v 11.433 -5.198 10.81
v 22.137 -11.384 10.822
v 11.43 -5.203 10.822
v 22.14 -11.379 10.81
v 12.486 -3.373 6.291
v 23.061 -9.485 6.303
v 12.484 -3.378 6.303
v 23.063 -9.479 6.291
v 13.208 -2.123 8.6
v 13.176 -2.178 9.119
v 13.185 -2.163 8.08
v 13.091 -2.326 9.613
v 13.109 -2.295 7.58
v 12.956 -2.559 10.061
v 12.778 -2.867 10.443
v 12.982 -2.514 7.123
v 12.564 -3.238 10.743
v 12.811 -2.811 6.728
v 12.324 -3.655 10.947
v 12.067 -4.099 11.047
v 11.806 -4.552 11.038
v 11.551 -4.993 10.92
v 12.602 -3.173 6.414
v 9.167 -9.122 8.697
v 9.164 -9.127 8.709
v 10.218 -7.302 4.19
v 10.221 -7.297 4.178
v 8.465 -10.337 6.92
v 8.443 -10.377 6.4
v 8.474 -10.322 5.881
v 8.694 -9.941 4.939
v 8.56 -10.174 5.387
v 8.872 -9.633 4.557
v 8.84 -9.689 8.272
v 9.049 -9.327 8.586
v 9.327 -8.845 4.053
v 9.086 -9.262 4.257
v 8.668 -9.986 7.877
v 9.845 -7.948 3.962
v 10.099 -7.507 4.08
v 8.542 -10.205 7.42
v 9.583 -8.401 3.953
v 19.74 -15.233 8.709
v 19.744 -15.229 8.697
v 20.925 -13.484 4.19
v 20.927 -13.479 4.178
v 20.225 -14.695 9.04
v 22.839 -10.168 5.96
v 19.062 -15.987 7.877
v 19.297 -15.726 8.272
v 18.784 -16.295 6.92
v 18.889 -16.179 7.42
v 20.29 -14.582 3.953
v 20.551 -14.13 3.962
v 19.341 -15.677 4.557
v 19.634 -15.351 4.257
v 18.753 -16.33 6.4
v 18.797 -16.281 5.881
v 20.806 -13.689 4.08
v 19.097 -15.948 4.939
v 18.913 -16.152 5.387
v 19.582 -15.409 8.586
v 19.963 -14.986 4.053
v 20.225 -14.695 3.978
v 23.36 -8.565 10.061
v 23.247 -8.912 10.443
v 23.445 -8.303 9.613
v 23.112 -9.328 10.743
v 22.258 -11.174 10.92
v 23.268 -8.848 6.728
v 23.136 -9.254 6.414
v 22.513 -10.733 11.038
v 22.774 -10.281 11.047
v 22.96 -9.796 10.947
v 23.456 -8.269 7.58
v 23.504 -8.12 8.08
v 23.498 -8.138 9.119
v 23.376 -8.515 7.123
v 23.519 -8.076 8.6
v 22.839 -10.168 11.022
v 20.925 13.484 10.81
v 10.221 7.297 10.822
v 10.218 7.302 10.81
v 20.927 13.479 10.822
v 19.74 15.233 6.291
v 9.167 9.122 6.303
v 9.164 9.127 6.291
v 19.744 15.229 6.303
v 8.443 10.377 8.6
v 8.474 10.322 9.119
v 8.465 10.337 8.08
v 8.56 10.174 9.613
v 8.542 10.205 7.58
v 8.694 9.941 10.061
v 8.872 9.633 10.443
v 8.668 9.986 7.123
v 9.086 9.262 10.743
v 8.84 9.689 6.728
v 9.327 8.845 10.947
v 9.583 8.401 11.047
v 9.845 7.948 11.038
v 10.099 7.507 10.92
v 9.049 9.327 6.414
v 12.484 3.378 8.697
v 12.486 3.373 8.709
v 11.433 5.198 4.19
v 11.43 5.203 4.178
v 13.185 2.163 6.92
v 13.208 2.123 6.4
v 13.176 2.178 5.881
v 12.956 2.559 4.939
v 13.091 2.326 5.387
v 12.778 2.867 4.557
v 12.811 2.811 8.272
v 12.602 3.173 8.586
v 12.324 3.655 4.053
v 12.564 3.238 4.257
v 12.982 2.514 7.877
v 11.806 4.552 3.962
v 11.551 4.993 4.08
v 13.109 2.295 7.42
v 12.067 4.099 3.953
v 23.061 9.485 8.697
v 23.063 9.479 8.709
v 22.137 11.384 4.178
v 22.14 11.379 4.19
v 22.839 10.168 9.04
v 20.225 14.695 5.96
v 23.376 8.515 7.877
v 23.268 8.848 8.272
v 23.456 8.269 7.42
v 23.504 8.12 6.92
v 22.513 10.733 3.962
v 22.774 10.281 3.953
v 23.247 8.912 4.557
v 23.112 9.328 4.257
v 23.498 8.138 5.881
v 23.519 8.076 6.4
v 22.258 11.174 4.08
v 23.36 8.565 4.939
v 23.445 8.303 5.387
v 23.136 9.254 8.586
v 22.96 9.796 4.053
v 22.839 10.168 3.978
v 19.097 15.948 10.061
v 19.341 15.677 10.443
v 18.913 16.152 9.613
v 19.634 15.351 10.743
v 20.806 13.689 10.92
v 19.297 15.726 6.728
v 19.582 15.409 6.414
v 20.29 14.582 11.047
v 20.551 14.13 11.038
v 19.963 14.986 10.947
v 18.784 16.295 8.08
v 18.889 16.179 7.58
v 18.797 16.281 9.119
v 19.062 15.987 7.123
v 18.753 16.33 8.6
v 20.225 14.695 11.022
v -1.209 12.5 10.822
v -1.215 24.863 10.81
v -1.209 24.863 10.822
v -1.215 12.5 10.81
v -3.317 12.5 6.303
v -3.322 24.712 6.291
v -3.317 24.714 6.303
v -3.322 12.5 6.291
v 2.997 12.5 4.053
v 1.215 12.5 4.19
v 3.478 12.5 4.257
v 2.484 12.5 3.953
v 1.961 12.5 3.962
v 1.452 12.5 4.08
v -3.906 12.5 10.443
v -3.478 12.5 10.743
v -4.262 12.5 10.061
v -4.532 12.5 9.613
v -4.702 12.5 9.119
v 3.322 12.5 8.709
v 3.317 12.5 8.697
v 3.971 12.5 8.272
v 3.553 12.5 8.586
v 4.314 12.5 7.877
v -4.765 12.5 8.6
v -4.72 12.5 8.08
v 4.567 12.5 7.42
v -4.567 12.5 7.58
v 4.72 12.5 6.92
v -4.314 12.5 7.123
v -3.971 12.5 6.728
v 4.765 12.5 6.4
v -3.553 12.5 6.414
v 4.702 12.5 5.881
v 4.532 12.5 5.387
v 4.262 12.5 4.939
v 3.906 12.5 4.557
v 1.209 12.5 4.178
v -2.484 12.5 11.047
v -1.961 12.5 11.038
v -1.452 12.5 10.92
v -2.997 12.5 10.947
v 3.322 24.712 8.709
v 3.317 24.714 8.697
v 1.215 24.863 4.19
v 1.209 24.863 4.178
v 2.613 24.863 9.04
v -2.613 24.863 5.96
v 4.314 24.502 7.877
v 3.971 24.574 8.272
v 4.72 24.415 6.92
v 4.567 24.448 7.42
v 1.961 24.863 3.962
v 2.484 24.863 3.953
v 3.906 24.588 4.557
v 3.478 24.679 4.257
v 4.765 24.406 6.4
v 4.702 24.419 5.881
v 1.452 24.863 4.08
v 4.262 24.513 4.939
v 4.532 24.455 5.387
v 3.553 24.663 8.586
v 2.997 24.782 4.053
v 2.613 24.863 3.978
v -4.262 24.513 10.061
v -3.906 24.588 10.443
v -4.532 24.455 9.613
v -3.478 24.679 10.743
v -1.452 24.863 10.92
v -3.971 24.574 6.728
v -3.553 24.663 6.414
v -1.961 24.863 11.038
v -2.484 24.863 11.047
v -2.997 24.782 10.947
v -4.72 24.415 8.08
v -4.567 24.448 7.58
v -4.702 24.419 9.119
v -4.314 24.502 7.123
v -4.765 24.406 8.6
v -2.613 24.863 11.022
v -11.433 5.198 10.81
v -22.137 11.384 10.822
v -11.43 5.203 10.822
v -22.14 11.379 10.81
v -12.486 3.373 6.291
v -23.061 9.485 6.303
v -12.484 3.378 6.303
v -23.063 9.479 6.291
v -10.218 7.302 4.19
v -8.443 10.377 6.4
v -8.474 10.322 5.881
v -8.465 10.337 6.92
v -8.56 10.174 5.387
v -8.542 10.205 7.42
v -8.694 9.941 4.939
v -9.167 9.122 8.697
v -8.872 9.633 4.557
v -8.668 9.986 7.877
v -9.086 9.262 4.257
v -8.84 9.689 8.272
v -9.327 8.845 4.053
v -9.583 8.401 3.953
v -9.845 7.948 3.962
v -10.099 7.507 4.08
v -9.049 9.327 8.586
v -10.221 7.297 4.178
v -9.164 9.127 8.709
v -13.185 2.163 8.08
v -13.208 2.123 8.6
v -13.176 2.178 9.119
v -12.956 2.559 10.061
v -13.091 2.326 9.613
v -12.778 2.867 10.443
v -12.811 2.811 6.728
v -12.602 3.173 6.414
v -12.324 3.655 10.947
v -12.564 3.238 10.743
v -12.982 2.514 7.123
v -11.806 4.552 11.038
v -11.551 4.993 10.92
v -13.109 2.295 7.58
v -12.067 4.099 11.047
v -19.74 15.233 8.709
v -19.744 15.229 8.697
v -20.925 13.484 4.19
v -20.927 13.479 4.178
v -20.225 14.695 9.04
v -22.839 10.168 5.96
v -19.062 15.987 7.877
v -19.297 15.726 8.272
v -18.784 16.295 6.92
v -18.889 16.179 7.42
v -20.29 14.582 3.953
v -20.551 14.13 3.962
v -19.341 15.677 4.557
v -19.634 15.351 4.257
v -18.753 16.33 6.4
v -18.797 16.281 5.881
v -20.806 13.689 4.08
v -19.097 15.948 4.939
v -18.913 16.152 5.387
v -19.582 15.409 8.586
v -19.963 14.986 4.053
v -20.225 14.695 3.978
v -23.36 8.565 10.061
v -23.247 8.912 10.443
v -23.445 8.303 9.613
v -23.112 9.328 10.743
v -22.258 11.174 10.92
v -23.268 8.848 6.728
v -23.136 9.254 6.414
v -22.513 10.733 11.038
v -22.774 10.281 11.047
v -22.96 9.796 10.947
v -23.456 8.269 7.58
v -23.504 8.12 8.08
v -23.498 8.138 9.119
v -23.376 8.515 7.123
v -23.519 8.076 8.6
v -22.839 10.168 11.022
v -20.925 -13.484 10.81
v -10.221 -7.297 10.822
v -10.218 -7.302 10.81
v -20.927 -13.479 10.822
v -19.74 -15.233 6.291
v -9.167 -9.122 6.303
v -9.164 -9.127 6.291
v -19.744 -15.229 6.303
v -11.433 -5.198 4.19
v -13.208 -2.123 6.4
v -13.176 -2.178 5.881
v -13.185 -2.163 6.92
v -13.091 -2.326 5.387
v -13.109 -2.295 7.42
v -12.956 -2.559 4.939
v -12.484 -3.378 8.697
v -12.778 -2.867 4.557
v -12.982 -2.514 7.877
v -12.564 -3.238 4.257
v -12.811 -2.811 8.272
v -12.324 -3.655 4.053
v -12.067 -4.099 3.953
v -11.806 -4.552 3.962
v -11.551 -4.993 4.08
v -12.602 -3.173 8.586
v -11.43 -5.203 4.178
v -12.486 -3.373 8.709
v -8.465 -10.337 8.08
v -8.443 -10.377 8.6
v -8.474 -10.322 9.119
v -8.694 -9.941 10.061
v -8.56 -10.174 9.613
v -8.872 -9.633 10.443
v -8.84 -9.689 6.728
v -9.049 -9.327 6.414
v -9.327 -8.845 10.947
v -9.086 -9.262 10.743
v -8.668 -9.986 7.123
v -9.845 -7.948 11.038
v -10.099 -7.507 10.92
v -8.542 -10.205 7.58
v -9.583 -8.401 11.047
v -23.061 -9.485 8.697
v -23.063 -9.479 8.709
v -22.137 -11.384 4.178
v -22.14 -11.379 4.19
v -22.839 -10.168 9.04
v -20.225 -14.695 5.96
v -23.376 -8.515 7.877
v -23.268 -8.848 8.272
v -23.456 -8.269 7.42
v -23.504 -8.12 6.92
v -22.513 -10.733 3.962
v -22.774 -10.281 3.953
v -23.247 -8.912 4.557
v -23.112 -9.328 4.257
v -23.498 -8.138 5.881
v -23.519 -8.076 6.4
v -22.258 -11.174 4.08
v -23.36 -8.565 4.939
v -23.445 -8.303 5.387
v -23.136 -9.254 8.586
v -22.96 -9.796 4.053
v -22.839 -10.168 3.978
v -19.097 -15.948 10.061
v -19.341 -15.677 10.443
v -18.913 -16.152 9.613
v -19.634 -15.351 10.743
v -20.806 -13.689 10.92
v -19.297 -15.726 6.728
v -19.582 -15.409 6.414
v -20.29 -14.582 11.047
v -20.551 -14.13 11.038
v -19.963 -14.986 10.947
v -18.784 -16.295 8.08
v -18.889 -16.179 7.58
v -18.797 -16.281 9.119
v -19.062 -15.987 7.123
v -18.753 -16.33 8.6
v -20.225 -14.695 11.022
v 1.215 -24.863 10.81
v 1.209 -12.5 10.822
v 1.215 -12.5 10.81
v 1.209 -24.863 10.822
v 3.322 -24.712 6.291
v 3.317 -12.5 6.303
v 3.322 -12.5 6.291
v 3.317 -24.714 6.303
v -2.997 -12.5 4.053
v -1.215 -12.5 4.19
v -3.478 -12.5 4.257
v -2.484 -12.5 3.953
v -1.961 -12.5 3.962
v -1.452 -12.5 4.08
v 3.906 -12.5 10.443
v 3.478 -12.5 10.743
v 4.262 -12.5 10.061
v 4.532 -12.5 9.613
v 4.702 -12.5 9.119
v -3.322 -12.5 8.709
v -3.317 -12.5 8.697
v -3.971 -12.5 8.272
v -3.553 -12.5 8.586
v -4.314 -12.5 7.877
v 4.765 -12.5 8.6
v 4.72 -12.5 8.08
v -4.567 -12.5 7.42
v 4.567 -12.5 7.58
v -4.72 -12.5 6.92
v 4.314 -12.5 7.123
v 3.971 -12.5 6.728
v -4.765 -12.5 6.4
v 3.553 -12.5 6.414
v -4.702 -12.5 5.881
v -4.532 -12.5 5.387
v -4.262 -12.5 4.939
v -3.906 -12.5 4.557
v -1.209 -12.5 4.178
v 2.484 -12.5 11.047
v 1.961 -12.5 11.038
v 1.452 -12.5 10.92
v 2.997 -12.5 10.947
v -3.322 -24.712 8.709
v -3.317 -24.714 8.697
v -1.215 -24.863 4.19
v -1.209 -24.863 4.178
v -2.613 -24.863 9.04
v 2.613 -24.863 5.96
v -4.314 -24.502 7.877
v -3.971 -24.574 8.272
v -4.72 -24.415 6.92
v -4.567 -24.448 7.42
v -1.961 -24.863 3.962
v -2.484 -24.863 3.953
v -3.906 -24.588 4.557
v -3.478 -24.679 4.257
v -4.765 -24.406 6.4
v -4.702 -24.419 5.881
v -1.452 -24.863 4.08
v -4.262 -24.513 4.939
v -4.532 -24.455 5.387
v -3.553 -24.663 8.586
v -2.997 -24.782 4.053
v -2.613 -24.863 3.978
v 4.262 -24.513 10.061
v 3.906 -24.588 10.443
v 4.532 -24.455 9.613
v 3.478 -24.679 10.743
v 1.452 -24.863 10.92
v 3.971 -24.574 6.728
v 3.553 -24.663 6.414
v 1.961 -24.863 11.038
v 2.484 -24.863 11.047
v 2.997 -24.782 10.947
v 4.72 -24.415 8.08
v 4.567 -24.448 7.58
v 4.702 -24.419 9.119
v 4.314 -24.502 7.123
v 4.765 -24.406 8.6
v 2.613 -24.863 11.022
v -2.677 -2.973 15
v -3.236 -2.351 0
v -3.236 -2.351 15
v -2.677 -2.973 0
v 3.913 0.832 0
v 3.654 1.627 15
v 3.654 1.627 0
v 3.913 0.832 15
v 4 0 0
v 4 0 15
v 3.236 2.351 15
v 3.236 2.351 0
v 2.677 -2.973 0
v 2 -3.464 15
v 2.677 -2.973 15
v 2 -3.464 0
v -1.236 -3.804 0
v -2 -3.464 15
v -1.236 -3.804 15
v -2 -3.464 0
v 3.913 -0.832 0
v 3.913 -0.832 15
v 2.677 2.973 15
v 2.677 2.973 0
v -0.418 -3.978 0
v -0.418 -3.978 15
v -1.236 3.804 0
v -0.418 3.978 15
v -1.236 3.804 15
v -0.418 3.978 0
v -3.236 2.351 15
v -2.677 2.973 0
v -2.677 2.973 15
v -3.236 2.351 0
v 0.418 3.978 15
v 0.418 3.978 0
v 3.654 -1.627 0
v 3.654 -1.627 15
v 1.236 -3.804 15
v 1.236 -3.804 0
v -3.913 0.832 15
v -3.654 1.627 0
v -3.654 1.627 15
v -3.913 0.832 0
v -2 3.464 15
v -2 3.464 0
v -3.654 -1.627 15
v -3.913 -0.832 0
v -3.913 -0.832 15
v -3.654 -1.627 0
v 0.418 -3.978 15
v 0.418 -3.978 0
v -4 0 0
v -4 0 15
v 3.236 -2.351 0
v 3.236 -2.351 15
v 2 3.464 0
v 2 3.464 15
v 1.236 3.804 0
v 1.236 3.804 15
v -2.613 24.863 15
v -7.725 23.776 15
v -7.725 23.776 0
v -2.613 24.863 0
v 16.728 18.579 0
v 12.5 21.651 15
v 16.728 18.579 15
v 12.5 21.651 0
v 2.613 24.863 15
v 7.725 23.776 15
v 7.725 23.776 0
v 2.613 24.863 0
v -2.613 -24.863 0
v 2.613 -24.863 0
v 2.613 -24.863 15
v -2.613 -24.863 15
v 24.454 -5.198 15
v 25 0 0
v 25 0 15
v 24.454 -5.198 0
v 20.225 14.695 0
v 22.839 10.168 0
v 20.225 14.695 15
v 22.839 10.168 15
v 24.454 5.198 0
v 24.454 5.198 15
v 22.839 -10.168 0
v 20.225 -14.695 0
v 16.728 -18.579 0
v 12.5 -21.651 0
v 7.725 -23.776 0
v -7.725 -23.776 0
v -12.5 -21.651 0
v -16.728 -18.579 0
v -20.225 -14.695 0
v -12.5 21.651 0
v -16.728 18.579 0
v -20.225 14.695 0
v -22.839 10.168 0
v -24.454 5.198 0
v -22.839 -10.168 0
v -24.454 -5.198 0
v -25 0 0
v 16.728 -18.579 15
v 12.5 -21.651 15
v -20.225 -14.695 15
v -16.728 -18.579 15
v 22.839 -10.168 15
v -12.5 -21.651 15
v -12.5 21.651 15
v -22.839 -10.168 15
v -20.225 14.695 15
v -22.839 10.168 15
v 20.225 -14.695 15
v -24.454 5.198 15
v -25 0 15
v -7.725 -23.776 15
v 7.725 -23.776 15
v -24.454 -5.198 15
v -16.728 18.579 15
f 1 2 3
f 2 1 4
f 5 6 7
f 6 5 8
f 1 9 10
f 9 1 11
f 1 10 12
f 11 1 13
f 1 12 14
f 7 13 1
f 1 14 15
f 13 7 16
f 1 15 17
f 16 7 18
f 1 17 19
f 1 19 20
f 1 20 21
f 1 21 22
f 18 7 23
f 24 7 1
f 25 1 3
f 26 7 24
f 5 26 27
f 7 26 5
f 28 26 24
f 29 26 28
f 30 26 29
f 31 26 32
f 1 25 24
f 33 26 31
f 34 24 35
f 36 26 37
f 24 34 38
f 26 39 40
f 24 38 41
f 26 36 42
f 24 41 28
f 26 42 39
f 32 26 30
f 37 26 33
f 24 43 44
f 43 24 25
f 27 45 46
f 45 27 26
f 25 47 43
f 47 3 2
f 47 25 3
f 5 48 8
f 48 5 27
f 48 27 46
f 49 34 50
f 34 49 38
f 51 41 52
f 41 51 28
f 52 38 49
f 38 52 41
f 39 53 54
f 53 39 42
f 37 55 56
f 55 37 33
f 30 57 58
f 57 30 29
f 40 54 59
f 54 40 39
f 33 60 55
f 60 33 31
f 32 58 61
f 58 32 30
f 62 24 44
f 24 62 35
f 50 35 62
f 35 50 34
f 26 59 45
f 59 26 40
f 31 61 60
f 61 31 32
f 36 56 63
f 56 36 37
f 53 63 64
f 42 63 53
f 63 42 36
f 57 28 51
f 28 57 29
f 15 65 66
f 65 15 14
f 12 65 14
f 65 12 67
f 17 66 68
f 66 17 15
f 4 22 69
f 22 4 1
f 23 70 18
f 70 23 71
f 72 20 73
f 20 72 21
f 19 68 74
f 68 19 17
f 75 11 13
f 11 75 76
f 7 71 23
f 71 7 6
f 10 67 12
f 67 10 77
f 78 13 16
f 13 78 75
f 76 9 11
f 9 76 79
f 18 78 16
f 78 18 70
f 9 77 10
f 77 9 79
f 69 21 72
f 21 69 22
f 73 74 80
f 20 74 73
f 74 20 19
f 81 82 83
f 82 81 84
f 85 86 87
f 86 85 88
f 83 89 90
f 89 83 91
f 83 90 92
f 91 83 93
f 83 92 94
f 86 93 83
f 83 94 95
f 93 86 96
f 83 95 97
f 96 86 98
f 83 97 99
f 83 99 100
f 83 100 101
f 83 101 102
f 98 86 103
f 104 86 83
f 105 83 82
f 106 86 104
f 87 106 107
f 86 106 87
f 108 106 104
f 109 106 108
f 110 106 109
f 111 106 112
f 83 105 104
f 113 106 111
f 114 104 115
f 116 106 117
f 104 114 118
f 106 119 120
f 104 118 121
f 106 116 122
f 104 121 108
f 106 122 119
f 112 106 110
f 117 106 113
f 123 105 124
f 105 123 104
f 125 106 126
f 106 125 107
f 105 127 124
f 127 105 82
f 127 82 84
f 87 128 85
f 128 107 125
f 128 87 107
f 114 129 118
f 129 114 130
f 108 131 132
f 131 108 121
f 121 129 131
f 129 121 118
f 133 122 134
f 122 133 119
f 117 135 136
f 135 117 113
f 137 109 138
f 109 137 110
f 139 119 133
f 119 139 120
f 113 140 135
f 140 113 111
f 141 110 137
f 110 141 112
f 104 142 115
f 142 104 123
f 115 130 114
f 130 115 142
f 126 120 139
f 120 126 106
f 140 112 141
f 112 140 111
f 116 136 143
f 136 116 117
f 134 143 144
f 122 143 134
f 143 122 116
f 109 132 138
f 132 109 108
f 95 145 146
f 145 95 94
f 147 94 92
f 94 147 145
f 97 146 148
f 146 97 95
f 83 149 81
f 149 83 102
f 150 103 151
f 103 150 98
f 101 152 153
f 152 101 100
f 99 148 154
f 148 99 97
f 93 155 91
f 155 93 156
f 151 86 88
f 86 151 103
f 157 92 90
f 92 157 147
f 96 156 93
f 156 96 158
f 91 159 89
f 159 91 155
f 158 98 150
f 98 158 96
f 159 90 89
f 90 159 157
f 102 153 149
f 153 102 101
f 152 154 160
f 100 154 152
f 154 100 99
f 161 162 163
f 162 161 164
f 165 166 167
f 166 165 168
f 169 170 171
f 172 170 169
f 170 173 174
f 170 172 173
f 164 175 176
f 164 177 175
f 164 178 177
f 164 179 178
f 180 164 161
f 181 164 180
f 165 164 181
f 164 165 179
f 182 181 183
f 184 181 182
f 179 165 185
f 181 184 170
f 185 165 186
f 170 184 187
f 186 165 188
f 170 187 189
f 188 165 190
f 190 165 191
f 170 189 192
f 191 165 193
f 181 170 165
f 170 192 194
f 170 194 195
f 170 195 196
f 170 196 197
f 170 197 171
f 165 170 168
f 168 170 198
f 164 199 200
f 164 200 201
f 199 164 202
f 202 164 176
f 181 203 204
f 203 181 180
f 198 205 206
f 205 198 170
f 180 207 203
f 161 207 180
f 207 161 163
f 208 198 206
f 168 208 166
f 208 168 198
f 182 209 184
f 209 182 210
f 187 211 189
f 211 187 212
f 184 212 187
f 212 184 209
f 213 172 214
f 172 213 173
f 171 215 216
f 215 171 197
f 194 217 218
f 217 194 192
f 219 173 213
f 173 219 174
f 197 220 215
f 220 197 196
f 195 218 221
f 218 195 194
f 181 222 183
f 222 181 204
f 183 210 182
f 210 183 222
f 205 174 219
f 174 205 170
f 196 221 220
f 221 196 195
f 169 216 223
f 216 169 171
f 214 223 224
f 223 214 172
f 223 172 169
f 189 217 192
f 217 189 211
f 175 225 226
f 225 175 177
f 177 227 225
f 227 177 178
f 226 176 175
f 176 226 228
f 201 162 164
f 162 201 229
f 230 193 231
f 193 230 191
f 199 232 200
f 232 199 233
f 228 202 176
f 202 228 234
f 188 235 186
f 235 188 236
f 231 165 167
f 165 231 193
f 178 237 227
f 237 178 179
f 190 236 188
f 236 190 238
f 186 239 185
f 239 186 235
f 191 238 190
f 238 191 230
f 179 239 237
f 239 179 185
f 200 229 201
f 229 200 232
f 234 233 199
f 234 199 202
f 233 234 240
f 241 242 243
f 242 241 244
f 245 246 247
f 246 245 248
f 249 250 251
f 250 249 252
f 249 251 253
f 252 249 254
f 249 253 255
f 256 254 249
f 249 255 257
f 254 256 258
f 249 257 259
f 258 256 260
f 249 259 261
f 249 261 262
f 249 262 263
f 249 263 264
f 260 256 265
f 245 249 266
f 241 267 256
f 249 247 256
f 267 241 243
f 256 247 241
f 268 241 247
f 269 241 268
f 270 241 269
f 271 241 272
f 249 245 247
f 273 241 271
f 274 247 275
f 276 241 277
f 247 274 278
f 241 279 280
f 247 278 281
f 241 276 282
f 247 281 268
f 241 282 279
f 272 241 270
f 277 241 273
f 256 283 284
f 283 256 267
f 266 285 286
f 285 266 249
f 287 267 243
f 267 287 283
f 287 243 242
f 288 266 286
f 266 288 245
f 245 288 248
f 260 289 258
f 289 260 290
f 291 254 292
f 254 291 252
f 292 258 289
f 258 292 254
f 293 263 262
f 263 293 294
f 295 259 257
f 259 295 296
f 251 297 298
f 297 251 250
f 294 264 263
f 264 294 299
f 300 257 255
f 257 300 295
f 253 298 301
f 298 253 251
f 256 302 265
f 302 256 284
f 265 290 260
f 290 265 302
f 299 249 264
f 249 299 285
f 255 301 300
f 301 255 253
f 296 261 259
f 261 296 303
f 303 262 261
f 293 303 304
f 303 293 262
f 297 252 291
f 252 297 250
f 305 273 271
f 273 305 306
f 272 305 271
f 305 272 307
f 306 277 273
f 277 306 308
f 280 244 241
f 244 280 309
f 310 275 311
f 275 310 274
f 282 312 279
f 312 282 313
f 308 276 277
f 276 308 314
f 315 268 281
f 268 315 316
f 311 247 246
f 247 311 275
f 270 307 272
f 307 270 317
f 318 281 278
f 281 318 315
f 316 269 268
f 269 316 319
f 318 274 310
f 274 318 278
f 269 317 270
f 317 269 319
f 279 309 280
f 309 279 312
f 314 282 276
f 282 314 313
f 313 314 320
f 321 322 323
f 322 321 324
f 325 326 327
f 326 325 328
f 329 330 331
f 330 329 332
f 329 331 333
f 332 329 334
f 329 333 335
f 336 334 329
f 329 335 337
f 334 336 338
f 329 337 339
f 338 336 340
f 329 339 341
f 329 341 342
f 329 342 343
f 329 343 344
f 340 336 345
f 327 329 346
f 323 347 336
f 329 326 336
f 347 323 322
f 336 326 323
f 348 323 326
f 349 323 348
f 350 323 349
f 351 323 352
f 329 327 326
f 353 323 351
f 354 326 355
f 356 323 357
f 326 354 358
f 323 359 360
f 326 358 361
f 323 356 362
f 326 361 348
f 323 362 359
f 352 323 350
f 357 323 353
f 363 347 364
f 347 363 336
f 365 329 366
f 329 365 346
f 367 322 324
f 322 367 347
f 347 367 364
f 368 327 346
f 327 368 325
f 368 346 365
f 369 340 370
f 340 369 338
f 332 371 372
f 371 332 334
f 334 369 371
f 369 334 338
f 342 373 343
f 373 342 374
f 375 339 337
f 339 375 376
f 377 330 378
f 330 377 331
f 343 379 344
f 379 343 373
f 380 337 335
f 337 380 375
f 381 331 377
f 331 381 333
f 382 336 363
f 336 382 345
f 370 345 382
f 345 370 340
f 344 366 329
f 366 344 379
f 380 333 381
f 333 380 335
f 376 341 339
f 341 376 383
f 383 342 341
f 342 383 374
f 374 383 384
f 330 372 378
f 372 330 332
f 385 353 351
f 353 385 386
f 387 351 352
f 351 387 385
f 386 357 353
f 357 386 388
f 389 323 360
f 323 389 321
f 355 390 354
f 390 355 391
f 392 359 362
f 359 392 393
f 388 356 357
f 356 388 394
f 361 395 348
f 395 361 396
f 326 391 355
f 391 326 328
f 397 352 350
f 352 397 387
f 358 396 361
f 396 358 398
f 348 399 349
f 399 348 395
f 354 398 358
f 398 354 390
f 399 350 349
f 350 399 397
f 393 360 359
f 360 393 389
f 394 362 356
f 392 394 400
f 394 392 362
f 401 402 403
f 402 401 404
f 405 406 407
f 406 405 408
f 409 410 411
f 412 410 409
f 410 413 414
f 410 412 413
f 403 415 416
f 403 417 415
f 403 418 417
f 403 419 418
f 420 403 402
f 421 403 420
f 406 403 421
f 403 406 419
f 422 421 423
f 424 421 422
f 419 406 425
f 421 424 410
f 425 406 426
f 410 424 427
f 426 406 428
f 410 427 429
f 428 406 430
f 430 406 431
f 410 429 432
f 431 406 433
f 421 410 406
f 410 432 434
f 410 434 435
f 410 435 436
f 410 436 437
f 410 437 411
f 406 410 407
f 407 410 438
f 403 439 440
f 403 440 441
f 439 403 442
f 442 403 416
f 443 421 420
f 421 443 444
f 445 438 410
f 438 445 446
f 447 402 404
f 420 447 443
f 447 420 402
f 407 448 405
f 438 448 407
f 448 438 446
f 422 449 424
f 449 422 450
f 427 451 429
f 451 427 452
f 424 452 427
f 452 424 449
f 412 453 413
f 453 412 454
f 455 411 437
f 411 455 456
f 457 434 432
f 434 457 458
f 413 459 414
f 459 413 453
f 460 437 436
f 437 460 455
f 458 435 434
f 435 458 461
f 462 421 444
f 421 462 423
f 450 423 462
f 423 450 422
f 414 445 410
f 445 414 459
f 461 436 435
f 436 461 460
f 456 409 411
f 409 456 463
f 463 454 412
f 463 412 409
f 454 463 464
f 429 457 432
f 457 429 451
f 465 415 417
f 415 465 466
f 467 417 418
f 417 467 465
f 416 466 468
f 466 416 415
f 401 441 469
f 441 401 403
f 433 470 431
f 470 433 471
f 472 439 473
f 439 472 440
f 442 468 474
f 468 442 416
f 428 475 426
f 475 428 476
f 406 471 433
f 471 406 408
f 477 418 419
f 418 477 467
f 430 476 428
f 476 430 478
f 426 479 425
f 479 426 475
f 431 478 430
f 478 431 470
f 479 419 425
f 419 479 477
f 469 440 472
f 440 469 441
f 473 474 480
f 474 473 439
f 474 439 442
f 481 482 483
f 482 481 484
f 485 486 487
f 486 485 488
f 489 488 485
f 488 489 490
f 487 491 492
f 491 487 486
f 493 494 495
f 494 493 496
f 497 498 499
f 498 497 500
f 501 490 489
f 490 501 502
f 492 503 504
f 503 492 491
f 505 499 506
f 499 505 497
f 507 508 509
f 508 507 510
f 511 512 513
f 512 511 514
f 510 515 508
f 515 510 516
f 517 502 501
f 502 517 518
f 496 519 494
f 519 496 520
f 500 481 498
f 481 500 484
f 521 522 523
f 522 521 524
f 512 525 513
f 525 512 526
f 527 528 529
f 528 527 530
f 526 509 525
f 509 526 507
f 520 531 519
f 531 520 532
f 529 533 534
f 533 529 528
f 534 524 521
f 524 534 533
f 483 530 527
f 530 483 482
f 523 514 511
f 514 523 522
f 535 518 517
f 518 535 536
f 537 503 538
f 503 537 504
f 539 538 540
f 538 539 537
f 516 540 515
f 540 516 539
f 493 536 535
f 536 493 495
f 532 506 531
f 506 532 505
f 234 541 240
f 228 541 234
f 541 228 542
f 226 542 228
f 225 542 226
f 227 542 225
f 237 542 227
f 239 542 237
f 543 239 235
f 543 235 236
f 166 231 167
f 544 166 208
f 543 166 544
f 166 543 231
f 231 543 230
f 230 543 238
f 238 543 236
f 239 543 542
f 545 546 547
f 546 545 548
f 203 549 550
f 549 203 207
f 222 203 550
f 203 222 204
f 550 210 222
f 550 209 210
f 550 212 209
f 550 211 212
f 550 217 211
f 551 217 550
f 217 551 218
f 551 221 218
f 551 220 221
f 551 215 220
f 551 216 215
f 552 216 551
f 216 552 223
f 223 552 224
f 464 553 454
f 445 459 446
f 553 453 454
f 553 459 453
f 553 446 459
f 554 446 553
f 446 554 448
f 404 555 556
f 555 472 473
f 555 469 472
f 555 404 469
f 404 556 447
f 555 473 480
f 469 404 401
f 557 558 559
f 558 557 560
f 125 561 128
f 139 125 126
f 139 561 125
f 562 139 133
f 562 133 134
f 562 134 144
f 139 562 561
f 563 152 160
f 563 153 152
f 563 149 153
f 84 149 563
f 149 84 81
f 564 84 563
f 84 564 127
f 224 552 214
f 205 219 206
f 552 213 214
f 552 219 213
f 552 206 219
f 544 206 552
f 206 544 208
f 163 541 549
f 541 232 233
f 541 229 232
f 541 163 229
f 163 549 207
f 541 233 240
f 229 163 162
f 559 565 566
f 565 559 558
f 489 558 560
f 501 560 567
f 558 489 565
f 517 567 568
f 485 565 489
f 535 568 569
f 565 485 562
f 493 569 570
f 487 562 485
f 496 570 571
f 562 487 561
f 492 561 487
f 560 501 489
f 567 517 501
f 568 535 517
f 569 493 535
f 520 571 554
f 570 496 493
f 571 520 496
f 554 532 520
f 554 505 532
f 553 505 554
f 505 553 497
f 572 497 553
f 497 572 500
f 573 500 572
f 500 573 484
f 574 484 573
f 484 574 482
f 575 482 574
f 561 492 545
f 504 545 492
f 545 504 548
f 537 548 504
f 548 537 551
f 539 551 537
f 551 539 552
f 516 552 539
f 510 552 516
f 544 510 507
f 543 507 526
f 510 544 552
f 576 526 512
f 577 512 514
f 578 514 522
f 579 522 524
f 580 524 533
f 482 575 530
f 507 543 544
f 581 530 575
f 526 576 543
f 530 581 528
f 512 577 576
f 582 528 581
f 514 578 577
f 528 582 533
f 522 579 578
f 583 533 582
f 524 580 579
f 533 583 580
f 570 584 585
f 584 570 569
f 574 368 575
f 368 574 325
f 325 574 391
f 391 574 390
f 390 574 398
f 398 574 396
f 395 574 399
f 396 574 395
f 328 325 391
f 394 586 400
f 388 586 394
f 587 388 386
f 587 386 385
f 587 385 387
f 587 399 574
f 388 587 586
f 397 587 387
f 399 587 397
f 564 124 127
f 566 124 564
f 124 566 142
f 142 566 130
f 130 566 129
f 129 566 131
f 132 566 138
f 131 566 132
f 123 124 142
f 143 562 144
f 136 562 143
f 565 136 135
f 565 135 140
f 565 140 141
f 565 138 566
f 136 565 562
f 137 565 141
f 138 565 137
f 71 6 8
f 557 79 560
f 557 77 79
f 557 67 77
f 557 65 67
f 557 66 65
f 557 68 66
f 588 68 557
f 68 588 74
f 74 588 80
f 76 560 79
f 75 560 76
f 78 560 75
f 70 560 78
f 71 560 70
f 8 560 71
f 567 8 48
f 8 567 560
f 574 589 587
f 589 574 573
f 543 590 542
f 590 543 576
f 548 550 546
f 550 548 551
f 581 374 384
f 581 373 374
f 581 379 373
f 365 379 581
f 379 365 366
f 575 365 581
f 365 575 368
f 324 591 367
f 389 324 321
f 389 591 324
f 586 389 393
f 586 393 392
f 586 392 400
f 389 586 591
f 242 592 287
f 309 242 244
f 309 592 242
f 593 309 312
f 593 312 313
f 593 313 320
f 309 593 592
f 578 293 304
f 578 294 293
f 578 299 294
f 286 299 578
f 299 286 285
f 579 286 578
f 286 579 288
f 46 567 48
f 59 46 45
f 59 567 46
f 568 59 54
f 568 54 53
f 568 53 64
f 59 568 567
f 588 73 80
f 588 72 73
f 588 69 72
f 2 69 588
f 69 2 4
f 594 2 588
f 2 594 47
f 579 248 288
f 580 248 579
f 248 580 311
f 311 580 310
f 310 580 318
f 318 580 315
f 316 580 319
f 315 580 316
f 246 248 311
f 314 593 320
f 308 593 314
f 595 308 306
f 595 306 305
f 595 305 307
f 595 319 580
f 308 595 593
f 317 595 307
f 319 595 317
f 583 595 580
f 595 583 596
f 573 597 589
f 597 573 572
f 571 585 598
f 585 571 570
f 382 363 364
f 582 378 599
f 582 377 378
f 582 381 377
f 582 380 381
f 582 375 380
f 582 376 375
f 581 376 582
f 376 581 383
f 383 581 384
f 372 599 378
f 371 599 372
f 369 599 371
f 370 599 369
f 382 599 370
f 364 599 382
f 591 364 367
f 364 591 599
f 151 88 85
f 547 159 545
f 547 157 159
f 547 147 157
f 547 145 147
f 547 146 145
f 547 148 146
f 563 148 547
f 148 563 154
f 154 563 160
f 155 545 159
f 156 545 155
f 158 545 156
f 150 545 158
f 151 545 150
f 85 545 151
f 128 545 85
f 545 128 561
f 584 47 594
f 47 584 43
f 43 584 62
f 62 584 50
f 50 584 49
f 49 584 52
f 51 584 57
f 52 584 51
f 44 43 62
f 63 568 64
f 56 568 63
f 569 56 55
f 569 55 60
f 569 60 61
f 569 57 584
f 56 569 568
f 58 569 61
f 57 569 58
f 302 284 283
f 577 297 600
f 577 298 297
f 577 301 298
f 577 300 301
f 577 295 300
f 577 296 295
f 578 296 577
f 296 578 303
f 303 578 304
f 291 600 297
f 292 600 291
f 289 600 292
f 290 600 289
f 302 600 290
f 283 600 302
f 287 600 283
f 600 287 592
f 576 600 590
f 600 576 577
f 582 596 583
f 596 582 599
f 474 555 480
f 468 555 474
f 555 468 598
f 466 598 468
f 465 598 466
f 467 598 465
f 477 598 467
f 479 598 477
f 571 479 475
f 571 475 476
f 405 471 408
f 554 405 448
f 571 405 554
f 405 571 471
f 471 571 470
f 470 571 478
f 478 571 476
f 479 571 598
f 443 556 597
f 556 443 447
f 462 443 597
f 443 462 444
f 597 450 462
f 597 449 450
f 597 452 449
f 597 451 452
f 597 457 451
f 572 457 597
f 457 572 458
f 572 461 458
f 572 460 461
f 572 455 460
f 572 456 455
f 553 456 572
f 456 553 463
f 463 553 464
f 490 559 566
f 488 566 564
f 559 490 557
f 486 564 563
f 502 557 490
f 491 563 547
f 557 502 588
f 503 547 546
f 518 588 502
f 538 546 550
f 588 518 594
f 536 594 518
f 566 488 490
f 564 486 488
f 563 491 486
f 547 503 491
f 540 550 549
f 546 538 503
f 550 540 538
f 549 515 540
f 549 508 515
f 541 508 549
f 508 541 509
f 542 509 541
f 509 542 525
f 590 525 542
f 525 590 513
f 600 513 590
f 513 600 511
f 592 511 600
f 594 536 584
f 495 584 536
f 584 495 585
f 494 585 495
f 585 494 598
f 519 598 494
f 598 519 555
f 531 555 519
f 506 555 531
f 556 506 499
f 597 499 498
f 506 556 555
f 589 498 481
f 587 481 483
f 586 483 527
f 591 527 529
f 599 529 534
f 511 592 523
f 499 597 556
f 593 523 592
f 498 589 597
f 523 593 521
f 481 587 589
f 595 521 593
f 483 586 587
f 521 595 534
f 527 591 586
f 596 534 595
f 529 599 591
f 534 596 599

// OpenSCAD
// Which one would you like to see?
part = "first"; // [first:Fan Barrel,second:Fan Blades,third:Base Stem,fourth:Base]

//Resolution of the curves.(Higher = more polygons and higher load time)
$fn = 30;
numberOfBlades = 6;
// In millimeters
lengthOfBlades = 125;
// In millimeters
widthOfBlades = 30;
// In millimeters
thicknessOfBlades = 2;
// In degrees
angleOfBlades = 25;
// Height of the center cylinder
heightOfBarrel = 15;
// Diameter of the center cylinder
diameterOfBarrel = 50;

print_part();
module print_part() {
	if (part == "first") {
		fanBarrel();
	} else if (part == "second") {
		fanBlades();
	} else if (part == "third") {
		baseStem();
	} else {
		base();
	}
}


// Fan Barrel
module fanBarrel(){
    difference(){
        cylinder( d = diameterOfBarrel, h = heightOfBarrel );
        union(){
            translate([0,0,-1]){
                cylinder( d = 8, h = heightOfBarrel + 2 );
            }
            for( i = [ 1 : numberOfBlades ] ){
                rotate(a = [90, 0, i * (360/numberOfBlades)]){
                    translate([0,heightOfBarrel/2,0]){
                        rotate(a = [0,0,angleOfBlades]){
                            translate([-2.5,0,diameterOfBarrel / 4]){
                                
                                union(){
                                    translate([0,-2.5,0]){
                                        cube([5, 5, diameterOfBarrel / 4 + 2]);
                                    }
                                    cylinder( d = 5, h = diameterOfBarrel / 4 + 2 );
                                    translate([5,0,0]){
                                        cylinder( d = 5, h = diameterOfBarrel / 4 + 2 );
                                    }
                                }
                            }
                        }
                    }
                }
            }
        }
    }
}
// Fan Blades
module fanBlades(){
    union(){
        cube([lengthOfBlades,widthOfBlades,thicknessOfBlades]);
        cube([4,widthOfBlades,5]);
        translate([2,(widthOfBlades/2)-2.5,2.5]){
            union(){
                rotate(a = [0,-90,0]){ rotate([0,0,90]){
                    translate([0,-2.5,0]){
                        cube([5, 5, diameterOfBarrel / 4 + 2]);
                    }
                    cylinder( d = 5, h = diameterOfBarrel / 4 + 2 );
                    translate([5,0,0]){
                        cylinder( d = 5, h = diameterOfBarrel / 4 + 2 );
                    }
                }}
            }
        }
    }
}
// Base Stem
module baseStem(){
    union(){
        cube([lengthOfBlades * 1.3,8,8]);
        translate([lengthOfBlades * 1.3 - 4,0,0]){
            cube([4,heightOfBarrel + 50,4]);
        }
        translate([lengthOfBlades * 1.3 - 4,heightOfBarrel + 49,0]){
            cube([7,4,4]);
        }
        difference(){
            translate([lengthOfBlades * 1.3 - (100 / sqrt(2)),-40,0]){
                rotate(a = [0,0,-45]){
                    cube([4,100,4]);
                }
            }
            translate([0,-100,-1]){
                cube([lengthOfBlades * 1.3,100,10]);
            }
        }
    }
}
// Base
module base(){
    difference(){
        cube([heightOfBarrel + 68,lengthOfBlades*1.5,10]);
        translate([4,(lengthOfBlades*1.5)/2,-1]){
            cube([8,8,12]);
        }
    }
}
